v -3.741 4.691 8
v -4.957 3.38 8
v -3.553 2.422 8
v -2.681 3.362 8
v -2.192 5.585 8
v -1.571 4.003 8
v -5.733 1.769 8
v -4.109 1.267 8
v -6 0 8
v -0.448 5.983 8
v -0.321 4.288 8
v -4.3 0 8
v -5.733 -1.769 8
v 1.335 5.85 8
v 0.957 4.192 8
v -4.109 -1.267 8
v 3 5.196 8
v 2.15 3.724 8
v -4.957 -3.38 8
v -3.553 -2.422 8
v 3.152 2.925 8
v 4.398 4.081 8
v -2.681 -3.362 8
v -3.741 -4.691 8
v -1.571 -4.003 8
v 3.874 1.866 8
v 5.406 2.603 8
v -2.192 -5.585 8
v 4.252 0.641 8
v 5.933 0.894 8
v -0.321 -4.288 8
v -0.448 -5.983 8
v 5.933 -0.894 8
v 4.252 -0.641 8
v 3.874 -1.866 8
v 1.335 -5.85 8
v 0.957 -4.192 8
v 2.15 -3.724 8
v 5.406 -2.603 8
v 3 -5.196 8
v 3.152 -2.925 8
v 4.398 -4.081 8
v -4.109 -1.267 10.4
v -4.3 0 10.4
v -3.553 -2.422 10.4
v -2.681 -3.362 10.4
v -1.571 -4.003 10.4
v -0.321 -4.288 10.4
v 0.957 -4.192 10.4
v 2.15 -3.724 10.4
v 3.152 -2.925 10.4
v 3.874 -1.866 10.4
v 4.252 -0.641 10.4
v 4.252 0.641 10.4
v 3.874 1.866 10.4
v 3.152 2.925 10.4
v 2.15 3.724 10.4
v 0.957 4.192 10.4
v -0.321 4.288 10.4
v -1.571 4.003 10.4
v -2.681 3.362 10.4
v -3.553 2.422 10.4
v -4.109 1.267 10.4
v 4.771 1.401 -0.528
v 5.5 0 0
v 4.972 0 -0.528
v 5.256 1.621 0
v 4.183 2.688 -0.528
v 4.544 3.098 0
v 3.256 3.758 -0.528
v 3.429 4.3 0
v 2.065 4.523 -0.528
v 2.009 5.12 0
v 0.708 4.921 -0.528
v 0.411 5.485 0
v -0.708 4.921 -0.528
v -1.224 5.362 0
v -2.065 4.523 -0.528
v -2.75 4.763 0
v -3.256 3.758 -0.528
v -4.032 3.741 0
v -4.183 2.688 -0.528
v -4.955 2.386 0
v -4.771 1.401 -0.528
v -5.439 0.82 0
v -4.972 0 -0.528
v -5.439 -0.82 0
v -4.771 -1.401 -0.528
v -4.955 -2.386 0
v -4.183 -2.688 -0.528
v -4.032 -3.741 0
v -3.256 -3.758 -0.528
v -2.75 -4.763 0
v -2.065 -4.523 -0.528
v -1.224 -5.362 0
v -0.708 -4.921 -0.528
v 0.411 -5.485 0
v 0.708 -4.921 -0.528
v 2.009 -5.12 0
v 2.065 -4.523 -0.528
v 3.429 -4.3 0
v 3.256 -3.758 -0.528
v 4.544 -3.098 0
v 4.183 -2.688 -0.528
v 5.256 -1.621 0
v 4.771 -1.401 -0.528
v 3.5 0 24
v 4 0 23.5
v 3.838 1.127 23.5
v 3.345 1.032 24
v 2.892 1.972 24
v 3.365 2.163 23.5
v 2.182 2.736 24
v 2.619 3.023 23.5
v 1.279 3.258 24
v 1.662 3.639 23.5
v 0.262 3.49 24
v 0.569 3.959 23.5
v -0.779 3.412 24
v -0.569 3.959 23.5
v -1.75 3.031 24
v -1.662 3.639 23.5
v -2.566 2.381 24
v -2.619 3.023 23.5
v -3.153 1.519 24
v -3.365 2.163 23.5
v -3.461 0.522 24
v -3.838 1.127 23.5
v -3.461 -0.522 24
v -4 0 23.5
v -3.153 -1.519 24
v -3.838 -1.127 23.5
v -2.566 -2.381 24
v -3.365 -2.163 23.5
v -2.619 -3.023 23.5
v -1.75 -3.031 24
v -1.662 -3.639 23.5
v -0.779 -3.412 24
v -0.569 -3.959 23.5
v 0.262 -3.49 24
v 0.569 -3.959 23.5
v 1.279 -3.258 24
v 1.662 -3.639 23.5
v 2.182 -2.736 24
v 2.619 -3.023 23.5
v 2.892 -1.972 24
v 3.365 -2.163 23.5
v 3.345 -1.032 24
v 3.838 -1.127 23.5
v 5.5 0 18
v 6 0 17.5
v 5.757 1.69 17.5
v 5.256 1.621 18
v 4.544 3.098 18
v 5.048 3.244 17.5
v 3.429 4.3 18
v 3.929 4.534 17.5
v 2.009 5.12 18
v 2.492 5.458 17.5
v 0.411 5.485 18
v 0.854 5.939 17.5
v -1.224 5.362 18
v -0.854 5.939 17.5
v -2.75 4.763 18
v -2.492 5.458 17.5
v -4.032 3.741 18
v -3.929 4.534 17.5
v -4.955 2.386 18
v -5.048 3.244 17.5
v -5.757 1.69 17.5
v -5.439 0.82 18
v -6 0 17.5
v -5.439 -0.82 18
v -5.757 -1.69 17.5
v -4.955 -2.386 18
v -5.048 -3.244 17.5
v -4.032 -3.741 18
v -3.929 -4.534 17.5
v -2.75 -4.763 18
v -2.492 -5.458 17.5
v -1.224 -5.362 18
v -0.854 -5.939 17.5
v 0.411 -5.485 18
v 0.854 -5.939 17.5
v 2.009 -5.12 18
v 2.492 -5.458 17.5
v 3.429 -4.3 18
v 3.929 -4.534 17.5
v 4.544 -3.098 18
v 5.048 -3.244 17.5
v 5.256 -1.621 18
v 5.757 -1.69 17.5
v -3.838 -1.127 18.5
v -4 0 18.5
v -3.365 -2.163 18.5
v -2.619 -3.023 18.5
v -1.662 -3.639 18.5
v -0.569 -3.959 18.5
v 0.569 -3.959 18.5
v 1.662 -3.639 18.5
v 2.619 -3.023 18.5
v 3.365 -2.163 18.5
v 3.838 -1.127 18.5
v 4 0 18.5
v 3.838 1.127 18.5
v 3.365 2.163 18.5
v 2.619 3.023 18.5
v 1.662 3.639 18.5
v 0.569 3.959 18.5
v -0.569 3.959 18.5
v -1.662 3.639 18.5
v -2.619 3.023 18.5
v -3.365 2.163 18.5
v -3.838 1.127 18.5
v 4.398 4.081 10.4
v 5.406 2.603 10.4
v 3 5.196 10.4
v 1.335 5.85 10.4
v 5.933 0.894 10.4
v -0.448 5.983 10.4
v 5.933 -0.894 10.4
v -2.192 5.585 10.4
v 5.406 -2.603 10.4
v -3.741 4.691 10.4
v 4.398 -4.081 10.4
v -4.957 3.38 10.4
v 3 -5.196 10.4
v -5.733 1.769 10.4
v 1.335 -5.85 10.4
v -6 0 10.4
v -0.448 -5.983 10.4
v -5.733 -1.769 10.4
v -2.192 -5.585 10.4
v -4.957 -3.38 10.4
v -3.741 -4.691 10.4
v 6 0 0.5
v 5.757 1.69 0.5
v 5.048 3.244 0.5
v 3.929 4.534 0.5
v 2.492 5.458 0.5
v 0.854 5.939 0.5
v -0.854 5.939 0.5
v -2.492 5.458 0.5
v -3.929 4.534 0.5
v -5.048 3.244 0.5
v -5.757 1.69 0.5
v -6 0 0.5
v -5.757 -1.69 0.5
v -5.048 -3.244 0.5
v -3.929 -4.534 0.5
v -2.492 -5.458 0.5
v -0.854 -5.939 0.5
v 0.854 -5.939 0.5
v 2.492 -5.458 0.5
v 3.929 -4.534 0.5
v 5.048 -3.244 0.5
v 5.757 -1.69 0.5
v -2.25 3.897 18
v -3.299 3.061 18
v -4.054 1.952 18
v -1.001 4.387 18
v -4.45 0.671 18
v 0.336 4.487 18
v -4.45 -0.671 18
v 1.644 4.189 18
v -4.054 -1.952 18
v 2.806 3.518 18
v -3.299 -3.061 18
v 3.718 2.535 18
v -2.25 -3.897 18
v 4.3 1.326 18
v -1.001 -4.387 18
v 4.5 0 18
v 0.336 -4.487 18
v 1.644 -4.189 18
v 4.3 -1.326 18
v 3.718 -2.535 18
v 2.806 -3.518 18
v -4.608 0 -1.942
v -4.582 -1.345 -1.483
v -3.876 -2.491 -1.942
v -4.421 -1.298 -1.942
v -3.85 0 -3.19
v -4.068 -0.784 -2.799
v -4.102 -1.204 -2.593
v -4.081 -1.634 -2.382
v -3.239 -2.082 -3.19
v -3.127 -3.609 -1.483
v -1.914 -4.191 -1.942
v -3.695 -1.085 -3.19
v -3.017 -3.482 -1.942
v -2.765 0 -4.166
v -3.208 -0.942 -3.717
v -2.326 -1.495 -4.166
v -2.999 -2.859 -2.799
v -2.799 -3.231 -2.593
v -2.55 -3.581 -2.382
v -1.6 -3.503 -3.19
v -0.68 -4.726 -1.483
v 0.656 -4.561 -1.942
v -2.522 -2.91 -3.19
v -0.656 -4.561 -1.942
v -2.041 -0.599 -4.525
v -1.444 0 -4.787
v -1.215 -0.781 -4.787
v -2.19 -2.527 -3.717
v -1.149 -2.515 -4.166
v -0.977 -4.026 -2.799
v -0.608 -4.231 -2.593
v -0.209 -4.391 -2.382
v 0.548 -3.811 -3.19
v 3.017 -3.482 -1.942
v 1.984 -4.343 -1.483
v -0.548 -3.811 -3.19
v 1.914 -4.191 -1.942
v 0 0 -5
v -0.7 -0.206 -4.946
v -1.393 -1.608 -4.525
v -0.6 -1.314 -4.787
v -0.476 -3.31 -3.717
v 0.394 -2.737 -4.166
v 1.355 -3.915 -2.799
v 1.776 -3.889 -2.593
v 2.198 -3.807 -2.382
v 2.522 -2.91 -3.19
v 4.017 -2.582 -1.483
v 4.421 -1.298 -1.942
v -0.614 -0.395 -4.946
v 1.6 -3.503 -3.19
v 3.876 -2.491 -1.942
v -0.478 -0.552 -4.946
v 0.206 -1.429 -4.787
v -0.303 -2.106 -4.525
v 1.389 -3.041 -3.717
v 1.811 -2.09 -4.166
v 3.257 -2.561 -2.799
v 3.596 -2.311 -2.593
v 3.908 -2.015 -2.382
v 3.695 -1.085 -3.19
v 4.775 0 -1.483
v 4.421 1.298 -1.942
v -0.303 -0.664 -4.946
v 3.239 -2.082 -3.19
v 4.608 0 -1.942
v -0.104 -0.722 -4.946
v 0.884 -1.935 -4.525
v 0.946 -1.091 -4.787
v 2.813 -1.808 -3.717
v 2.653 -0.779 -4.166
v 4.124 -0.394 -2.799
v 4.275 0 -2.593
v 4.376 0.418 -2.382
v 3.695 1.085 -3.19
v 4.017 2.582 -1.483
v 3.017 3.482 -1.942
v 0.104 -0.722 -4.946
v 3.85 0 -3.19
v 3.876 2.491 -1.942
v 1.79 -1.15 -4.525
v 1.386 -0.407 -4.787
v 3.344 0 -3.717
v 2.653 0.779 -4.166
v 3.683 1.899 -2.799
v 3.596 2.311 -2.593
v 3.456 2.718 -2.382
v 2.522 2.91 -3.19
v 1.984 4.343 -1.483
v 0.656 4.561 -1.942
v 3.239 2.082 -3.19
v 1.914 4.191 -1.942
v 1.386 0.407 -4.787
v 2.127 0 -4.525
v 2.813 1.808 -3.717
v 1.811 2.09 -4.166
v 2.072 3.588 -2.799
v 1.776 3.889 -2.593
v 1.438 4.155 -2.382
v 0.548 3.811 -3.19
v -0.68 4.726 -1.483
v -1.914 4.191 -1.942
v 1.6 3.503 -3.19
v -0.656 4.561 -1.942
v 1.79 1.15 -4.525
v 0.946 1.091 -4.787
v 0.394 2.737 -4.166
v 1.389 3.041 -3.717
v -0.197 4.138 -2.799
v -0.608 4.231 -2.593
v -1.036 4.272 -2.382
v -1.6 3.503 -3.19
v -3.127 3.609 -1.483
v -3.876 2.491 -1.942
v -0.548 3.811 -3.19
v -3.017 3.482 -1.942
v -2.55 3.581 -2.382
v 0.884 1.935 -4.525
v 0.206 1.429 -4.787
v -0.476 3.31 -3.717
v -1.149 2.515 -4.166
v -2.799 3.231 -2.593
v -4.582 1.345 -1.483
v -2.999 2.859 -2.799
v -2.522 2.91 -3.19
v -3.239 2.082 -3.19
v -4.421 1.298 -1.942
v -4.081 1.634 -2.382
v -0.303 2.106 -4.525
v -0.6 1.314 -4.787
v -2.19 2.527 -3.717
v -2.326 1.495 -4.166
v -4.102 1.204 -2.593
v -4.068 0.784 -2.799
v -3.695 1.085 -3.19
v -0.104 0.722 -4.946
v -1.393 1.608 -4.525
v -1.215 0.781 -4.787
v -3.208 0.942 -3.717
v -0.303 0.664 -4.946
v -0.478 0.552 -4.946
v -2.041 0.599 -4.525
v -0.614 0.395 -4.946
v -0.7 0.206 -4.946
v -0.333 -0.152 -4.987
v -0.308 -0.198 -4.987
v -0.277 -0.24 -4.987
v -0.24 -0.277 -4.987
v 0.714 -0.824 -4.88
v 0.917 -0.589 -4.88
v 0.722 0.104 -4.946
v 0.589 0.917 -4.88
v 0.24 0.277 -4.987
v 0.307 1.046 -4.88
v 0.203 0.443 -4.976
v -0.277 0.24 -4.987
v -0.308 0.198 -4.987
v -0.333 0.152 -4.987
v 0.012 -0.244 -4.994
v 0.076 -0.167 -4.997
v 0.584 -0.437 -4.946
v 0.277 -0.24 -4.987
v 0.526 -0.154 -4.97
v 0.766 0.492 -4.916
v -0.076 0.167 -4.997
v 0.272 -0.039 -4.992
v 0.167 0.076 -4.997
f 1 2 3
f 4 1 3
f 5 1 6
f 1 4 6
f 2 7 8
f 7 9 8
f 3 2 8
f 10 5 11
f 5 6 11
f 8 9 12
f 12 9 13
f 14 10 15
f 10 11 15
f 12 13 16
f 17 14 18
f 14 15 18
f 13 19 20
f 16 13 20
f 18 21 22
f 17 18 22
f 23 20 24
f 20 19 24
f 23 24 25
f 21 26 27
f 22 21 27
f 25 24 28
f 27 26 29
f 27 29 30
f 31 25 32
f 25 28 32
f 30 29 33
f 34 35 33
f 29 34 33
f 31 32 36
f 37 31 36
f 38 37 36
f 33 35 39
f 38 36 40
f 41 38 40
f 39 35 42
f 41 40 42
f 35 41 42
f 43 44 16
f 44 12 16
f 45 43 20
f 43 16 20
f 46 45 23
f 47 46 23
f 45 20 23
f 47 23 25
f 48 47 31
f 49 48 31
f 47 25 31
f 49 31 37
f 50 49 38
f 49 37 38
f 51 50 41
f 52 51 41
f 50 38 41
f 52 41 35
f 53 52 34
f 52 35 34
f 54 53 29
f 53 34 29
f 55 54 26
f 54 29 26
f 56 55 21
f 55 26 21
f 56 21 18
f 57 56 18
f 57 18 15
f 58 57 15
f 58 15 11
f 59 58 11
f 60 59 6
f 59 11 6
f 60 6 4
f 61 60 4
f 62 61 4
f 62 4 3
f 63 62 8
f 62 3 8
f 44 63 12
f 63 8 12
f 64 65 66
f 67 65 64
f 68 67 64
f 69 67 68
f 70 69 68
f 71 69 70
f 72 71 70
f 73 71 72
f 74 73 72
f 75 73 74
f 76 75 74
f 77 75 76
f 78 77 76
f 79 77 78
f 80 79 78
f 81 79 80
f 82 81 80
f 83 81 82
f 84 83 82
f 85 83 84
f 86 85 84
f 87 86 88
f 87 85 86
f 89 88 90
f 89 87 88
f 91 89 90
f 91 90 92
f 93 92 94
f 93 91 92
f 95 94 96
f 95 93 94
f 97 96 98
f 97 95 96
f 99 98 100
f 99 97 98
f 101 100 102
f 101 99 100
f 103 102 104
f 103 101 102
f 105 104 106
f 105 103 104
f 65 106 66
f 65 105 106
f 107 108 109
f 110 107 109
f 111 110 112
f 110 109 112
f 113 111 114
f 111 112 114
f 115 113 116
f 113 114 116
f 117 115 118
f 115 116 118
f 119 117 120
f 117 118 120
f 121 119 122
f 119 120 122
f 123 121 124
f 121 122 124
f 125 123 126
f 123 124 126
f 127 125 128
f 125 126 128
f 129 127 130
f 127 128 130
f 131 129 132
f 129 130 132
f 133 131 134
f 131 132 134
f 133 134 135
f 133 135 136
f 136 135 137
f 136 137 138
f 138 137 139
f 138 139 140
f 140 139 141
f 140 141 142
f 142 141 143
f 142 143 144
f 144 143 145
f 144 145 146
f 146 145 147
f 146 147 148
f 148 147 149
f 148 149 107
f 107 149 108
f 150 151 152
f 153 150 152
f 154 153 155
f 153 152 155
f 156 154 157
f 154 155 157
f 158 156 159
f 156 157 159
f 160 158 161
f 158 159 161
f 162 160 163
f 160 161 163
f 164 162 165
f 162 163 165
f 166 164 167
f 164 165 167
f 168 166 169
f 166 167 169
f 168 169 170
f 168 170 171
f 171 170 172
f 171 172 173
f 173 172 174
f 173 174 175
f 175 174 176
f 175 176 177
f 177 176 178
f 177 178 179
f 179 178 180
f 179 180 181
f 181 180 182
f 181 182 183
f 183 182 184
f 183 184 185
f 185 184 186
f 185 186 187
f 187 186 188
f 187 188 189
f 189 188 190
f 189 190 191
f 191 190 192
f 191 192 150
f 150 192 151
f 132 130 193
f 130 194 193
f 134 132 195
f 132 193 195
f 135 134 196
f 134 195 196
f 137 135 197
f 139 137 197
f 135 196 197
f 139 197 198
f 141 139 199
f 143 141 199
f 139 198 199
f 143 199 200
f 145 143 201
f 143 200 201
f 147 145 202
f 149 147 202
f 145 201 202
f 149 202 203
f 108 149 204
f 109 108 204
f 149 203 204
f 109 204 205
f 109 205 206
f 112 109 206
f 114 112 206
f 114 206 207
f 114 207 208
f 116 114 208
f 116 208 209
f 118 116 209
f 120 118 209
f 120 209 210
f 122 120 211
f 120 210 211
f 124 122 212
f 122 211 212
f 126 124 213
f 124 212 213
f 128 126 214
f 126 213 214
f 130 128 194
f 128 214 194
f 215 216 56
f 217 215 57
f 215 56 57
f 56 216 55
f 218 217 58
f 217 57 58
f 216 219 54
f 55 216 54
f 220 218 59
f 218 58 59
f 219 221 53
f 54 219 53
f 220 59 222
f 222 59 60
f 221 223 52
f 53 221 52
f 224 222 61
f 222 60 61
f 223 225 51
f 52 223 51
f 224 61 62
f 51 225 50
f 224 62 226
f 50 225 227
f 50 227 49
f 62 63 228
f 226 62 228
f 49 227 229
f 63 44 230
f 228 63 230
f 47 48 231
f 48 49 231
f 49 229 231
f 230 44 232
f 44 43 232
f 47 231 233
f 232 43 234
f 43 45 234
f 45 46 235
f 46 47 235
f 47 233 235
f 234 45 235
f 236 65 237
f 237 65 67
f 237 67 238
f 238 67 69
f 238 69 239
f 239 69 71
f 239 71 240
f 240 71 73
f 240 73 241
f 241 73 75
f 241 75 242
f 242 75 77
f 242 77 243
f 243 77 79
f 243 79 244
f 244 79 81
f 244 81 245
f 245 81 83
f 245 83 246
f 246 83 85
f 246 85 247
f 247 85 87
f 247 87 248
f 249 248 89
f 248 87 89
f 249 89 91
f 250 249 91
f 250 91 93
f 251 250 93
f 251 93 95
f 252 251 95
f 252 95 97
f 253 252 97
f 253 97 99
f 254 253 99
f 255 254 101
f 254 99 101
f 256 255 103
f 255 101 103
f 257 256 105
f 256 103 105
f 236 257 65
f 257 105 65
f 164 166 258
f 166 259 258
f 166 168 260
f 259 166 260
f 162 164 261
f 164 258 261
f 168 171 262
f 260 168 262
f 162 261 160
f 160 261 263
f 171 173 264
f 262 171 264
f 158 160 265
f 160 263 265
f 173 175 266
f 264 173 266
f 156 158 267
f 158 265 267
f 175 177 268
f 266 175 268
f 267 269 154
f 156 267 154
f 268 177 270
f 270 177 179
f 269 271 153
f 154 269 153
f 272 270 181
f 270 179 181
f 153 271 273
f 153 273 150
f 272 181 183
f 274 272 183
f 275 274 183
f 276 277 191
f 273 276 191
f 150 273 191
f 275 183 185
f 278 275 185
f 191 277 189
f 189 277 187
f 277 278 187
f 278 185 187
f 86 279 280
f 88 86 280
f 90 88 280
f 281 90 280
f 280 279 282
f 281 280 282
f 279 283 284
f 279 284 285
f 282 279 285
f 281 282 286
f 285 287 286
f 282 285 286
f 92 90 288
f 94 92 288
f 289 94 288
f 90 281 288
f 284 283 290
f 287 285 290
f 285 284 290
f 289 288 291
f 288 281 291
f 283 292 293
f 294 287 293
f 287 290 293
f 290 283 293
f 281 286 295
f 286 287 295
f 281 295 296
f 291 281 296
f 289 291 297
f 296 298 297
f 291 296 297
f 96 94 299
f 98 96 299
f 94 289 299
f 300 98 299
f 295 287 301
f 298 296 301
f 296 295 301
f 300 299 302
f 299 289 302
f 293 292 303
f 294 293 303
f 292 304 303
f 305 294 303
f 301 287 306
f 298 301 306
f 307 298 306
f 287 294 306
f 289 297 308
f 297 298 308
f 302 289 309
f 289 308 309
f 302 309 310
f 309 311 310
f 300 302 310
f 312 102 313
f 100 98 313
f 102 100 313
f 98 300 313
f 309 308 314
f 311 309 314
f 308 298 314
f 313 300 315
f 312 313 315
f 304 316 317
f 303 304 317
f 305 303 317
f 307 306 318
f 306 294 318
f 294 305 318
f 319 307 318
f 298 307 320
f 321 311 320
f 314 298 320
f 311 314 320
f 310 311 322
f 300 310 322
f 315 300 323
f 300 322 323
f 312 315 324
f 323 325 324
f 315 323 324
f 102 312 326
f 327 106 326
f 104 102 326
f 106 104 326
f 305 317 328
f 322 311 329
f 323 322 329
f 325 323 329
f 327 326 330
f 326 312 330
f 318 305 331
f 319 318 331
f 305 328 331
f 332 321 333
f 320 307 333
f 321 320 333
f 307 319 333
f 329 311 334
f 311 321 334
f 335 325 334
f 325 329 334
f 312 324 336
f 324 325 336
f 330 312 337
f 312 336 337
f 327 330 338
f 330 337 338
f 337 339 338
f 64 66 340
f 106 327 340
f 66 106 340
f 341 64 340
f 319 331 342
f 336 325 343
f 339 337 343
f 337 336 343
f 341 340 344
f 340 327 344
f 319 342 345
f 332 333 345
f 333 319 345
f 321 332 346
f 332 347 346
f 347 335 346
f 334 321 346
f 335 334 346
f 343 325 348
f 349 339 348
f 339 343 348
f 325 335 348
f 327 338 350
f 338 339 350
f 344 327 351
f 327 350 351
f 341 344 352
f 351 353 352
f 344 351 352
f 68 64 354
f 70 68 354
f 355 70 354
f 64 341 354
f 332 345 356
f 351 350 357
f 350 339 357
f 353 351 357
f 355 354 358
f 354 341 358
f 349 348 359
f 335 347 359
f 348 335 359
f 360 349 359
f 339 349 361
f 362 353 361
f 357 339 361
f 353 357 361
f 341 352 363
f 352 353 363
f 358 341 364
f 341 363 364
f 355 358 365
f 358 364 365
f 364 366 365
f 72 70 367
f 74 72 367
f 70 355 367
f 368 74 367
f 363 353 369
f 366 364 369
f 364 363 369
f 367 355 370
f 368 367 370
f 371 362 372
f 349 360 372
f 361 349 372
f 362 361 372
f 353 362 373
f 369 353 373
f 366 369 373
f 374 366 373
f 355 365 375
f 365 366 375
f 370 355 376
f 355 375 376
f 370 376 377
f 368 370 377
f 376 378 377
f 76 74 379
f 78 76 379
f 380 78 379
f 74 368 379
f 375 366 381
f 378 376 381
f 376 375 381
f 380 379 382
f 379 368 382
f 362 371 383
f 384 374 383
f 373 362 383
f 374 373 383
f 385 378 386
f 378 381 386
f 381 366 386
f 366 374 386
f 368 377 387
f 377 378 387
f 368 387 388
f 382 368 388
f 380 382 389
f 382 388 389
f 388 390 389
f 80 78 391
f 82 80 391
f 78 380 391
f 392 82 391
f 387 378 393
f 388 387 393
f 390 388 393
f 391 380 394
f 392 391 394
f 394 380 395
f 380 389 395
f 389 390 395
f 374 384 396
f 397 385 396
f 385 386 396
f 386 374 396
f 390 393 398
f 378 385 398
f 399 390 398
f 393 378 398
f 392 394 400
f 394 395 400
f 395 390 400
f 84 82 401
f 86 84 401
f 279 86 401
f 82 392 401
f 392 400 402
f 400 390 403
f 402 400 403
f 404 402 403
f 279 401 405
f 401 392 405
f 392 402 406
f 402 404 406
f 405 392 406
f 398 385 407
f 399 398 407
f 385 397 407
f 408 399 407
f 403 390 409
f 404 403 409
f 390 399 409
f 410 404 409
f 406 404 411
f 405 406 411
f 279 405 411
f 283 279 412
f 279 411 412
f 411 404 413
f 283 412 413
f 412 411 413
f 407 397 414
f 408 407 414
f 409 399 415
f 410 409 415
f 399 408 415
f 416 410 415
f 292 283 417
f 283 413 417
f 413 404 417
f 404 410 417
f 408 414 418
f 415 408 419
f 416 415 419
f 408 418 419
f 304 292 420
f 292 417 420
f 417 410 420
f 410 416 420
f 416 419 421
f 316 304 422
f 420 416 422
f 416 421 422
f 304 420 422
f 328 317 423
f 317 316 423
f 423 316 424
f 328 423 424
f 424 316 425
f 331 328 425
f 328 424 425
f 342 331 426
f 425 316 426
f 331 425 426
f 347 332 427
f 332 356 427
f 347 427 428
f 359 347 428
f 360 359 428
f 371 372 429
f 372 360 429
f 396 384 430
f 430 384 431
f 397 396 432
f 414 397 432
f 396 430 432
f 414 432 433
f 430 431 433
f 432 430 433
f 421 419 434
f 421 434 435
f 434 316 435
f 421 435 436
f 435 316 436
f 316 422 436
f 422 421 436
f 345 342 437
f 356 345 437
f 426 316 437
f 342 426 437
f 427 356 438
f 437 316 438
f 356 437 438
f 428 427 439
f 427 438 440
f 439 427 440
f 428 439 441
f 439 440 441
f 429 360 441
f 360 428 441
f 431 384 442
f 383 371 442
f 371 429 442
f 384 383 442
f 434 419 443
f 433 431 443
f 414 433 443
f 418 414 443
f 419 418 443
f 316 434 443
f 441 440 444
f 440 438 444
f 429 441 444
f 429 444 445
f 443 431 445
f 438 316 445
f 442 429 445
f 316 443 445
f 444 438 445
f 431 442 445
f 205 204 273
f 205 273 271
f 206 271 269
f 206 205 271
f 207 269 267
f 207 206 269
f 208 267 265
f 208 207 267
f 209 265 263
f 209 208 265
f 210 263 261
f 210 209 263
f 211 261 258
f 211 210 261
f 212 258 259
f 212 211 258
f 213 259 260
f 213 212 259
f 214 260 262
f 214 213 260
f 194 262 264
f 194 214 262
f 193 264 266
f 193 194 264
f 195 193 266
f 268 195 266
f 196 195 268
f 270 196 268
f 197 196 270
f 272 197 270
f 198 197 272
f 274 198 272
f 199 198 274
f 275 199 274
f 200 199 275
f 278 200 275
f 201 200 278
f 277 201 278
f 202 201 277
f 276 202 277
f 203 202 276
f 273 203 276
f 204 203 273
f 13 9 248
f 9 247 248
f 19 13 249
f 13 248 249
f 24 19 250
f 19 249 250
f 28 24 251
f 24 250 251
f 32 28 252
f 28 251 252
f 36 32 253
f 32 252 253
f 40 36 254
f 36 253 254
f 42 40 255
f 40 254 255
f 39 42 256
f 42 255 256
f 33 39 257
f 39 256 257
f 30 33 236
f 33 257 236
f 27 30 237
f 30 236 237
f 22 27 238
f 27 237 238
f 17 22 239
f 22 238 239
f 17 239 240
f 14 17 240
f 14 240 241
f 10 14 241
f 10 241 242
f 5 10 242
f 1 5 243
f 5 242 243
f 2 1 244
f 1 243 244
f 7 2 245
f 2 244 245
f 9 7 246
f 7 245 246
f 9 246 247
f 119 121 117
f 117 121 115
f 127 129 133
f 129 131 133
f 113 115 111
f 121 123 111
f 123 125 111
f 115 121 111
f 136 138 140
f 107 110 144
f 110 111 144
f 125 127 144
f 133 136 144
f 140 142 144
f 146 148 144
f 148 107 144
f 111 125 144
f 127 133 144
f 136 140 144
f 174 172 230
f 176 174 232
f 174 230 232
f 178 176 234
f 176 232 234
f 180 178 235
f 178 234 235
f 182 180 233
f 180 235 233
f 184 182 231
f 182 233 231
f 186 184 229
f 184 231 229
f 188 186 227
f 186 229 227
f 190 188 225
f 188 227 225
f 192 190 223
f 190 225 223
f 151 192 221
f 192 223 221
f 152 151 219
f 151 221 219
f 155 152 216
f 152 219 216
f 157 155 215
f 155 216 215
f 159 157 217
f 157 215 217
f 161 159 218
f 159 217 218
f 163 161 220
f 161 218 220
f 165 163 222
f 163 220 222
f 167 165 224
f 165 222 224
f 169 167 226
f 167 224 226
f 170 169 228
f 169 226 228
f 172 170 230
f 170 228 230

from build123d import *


with BuildPart() as part:
    # Sketch_plunger → Rev_plunger (revolve)
    with BuildSketch(Plane(origin=(0, 0, 0), x_dir=(1, 0, 0), z_dir=(0, 1, 0)), mode=Mode.PRIVATE) as rev_plunger_sk:
        with BuildLine():
            Line((0, 5), (0, -24))
            Line((0, -24), (4, -24))
            Line((4, -24), (4, -18))
            Line((4, -18), (6, -18))
            Line((6, -18), (6, -10.4))
            Line((6, -10.4), (4.3, -10.4))
            Line((4.3, -10.4), (4.3, -8))
            Line((4.3, -8), (6, -8))
            Line((6, -8), (6, 0))
            Line((6, 0), (5, 0))
            ThreePointArc((5, 0), (3.5355, 3.5355), (0, 5))
        make_face()
    revolve(rev_plunger_sk.sketch.rotate(Axis((0, 0, 0), (0, 0, 1)), 180), axis=Axis((0, 0, 0), (0, 0, 1)))

    # Chamfer_C05: read off the stored shape, not the designer's step
    # Chamfer_C05 outline → Chamfer_C05 (revolve, cut)
    with BuildSketch(Plane.XZ):
        Polygon((3.5, 24), (4, 23.5), (4, 24), align=None)
        Polygon((6, 18), (5.5, 18), (6, 17.5), align=None)
        Polygon((6, -0.52796442), (6, 0.5), (5.5, 0), (5.5, -0.52796442), align=None)
    revolve(axis=Axis((0, 0, 0), (0, 0, 1)), mode=Mode.SUBTRACT)

    # Chamfer_C05 2 outline → Chamfer_C05 2 (revolve)
    with BuildSketch(Plane.XZ):
        Polygon((4.5, 18), (4, 18.5), (4, 18), align=None)
        Polygon((5.5, 0.5), (4.97203558, 0.5), (4.97203558, -0.52796442), (5.5, 0), align=None)
    revolve(axis=Axis((0, 0, 0), (0, 0, 1)))

    # Chamfer_C05 3 outline → Chamfer_C05 3 (revolve)
    with BuildSketch(Plane.XZ):
        Polygon((5.5, 0.5), (5.5, 0), (6, 0.5), align=None)
    revolve(axis=Axis((0, 0, 0), (0, 0, 1)))


solid = part.part
